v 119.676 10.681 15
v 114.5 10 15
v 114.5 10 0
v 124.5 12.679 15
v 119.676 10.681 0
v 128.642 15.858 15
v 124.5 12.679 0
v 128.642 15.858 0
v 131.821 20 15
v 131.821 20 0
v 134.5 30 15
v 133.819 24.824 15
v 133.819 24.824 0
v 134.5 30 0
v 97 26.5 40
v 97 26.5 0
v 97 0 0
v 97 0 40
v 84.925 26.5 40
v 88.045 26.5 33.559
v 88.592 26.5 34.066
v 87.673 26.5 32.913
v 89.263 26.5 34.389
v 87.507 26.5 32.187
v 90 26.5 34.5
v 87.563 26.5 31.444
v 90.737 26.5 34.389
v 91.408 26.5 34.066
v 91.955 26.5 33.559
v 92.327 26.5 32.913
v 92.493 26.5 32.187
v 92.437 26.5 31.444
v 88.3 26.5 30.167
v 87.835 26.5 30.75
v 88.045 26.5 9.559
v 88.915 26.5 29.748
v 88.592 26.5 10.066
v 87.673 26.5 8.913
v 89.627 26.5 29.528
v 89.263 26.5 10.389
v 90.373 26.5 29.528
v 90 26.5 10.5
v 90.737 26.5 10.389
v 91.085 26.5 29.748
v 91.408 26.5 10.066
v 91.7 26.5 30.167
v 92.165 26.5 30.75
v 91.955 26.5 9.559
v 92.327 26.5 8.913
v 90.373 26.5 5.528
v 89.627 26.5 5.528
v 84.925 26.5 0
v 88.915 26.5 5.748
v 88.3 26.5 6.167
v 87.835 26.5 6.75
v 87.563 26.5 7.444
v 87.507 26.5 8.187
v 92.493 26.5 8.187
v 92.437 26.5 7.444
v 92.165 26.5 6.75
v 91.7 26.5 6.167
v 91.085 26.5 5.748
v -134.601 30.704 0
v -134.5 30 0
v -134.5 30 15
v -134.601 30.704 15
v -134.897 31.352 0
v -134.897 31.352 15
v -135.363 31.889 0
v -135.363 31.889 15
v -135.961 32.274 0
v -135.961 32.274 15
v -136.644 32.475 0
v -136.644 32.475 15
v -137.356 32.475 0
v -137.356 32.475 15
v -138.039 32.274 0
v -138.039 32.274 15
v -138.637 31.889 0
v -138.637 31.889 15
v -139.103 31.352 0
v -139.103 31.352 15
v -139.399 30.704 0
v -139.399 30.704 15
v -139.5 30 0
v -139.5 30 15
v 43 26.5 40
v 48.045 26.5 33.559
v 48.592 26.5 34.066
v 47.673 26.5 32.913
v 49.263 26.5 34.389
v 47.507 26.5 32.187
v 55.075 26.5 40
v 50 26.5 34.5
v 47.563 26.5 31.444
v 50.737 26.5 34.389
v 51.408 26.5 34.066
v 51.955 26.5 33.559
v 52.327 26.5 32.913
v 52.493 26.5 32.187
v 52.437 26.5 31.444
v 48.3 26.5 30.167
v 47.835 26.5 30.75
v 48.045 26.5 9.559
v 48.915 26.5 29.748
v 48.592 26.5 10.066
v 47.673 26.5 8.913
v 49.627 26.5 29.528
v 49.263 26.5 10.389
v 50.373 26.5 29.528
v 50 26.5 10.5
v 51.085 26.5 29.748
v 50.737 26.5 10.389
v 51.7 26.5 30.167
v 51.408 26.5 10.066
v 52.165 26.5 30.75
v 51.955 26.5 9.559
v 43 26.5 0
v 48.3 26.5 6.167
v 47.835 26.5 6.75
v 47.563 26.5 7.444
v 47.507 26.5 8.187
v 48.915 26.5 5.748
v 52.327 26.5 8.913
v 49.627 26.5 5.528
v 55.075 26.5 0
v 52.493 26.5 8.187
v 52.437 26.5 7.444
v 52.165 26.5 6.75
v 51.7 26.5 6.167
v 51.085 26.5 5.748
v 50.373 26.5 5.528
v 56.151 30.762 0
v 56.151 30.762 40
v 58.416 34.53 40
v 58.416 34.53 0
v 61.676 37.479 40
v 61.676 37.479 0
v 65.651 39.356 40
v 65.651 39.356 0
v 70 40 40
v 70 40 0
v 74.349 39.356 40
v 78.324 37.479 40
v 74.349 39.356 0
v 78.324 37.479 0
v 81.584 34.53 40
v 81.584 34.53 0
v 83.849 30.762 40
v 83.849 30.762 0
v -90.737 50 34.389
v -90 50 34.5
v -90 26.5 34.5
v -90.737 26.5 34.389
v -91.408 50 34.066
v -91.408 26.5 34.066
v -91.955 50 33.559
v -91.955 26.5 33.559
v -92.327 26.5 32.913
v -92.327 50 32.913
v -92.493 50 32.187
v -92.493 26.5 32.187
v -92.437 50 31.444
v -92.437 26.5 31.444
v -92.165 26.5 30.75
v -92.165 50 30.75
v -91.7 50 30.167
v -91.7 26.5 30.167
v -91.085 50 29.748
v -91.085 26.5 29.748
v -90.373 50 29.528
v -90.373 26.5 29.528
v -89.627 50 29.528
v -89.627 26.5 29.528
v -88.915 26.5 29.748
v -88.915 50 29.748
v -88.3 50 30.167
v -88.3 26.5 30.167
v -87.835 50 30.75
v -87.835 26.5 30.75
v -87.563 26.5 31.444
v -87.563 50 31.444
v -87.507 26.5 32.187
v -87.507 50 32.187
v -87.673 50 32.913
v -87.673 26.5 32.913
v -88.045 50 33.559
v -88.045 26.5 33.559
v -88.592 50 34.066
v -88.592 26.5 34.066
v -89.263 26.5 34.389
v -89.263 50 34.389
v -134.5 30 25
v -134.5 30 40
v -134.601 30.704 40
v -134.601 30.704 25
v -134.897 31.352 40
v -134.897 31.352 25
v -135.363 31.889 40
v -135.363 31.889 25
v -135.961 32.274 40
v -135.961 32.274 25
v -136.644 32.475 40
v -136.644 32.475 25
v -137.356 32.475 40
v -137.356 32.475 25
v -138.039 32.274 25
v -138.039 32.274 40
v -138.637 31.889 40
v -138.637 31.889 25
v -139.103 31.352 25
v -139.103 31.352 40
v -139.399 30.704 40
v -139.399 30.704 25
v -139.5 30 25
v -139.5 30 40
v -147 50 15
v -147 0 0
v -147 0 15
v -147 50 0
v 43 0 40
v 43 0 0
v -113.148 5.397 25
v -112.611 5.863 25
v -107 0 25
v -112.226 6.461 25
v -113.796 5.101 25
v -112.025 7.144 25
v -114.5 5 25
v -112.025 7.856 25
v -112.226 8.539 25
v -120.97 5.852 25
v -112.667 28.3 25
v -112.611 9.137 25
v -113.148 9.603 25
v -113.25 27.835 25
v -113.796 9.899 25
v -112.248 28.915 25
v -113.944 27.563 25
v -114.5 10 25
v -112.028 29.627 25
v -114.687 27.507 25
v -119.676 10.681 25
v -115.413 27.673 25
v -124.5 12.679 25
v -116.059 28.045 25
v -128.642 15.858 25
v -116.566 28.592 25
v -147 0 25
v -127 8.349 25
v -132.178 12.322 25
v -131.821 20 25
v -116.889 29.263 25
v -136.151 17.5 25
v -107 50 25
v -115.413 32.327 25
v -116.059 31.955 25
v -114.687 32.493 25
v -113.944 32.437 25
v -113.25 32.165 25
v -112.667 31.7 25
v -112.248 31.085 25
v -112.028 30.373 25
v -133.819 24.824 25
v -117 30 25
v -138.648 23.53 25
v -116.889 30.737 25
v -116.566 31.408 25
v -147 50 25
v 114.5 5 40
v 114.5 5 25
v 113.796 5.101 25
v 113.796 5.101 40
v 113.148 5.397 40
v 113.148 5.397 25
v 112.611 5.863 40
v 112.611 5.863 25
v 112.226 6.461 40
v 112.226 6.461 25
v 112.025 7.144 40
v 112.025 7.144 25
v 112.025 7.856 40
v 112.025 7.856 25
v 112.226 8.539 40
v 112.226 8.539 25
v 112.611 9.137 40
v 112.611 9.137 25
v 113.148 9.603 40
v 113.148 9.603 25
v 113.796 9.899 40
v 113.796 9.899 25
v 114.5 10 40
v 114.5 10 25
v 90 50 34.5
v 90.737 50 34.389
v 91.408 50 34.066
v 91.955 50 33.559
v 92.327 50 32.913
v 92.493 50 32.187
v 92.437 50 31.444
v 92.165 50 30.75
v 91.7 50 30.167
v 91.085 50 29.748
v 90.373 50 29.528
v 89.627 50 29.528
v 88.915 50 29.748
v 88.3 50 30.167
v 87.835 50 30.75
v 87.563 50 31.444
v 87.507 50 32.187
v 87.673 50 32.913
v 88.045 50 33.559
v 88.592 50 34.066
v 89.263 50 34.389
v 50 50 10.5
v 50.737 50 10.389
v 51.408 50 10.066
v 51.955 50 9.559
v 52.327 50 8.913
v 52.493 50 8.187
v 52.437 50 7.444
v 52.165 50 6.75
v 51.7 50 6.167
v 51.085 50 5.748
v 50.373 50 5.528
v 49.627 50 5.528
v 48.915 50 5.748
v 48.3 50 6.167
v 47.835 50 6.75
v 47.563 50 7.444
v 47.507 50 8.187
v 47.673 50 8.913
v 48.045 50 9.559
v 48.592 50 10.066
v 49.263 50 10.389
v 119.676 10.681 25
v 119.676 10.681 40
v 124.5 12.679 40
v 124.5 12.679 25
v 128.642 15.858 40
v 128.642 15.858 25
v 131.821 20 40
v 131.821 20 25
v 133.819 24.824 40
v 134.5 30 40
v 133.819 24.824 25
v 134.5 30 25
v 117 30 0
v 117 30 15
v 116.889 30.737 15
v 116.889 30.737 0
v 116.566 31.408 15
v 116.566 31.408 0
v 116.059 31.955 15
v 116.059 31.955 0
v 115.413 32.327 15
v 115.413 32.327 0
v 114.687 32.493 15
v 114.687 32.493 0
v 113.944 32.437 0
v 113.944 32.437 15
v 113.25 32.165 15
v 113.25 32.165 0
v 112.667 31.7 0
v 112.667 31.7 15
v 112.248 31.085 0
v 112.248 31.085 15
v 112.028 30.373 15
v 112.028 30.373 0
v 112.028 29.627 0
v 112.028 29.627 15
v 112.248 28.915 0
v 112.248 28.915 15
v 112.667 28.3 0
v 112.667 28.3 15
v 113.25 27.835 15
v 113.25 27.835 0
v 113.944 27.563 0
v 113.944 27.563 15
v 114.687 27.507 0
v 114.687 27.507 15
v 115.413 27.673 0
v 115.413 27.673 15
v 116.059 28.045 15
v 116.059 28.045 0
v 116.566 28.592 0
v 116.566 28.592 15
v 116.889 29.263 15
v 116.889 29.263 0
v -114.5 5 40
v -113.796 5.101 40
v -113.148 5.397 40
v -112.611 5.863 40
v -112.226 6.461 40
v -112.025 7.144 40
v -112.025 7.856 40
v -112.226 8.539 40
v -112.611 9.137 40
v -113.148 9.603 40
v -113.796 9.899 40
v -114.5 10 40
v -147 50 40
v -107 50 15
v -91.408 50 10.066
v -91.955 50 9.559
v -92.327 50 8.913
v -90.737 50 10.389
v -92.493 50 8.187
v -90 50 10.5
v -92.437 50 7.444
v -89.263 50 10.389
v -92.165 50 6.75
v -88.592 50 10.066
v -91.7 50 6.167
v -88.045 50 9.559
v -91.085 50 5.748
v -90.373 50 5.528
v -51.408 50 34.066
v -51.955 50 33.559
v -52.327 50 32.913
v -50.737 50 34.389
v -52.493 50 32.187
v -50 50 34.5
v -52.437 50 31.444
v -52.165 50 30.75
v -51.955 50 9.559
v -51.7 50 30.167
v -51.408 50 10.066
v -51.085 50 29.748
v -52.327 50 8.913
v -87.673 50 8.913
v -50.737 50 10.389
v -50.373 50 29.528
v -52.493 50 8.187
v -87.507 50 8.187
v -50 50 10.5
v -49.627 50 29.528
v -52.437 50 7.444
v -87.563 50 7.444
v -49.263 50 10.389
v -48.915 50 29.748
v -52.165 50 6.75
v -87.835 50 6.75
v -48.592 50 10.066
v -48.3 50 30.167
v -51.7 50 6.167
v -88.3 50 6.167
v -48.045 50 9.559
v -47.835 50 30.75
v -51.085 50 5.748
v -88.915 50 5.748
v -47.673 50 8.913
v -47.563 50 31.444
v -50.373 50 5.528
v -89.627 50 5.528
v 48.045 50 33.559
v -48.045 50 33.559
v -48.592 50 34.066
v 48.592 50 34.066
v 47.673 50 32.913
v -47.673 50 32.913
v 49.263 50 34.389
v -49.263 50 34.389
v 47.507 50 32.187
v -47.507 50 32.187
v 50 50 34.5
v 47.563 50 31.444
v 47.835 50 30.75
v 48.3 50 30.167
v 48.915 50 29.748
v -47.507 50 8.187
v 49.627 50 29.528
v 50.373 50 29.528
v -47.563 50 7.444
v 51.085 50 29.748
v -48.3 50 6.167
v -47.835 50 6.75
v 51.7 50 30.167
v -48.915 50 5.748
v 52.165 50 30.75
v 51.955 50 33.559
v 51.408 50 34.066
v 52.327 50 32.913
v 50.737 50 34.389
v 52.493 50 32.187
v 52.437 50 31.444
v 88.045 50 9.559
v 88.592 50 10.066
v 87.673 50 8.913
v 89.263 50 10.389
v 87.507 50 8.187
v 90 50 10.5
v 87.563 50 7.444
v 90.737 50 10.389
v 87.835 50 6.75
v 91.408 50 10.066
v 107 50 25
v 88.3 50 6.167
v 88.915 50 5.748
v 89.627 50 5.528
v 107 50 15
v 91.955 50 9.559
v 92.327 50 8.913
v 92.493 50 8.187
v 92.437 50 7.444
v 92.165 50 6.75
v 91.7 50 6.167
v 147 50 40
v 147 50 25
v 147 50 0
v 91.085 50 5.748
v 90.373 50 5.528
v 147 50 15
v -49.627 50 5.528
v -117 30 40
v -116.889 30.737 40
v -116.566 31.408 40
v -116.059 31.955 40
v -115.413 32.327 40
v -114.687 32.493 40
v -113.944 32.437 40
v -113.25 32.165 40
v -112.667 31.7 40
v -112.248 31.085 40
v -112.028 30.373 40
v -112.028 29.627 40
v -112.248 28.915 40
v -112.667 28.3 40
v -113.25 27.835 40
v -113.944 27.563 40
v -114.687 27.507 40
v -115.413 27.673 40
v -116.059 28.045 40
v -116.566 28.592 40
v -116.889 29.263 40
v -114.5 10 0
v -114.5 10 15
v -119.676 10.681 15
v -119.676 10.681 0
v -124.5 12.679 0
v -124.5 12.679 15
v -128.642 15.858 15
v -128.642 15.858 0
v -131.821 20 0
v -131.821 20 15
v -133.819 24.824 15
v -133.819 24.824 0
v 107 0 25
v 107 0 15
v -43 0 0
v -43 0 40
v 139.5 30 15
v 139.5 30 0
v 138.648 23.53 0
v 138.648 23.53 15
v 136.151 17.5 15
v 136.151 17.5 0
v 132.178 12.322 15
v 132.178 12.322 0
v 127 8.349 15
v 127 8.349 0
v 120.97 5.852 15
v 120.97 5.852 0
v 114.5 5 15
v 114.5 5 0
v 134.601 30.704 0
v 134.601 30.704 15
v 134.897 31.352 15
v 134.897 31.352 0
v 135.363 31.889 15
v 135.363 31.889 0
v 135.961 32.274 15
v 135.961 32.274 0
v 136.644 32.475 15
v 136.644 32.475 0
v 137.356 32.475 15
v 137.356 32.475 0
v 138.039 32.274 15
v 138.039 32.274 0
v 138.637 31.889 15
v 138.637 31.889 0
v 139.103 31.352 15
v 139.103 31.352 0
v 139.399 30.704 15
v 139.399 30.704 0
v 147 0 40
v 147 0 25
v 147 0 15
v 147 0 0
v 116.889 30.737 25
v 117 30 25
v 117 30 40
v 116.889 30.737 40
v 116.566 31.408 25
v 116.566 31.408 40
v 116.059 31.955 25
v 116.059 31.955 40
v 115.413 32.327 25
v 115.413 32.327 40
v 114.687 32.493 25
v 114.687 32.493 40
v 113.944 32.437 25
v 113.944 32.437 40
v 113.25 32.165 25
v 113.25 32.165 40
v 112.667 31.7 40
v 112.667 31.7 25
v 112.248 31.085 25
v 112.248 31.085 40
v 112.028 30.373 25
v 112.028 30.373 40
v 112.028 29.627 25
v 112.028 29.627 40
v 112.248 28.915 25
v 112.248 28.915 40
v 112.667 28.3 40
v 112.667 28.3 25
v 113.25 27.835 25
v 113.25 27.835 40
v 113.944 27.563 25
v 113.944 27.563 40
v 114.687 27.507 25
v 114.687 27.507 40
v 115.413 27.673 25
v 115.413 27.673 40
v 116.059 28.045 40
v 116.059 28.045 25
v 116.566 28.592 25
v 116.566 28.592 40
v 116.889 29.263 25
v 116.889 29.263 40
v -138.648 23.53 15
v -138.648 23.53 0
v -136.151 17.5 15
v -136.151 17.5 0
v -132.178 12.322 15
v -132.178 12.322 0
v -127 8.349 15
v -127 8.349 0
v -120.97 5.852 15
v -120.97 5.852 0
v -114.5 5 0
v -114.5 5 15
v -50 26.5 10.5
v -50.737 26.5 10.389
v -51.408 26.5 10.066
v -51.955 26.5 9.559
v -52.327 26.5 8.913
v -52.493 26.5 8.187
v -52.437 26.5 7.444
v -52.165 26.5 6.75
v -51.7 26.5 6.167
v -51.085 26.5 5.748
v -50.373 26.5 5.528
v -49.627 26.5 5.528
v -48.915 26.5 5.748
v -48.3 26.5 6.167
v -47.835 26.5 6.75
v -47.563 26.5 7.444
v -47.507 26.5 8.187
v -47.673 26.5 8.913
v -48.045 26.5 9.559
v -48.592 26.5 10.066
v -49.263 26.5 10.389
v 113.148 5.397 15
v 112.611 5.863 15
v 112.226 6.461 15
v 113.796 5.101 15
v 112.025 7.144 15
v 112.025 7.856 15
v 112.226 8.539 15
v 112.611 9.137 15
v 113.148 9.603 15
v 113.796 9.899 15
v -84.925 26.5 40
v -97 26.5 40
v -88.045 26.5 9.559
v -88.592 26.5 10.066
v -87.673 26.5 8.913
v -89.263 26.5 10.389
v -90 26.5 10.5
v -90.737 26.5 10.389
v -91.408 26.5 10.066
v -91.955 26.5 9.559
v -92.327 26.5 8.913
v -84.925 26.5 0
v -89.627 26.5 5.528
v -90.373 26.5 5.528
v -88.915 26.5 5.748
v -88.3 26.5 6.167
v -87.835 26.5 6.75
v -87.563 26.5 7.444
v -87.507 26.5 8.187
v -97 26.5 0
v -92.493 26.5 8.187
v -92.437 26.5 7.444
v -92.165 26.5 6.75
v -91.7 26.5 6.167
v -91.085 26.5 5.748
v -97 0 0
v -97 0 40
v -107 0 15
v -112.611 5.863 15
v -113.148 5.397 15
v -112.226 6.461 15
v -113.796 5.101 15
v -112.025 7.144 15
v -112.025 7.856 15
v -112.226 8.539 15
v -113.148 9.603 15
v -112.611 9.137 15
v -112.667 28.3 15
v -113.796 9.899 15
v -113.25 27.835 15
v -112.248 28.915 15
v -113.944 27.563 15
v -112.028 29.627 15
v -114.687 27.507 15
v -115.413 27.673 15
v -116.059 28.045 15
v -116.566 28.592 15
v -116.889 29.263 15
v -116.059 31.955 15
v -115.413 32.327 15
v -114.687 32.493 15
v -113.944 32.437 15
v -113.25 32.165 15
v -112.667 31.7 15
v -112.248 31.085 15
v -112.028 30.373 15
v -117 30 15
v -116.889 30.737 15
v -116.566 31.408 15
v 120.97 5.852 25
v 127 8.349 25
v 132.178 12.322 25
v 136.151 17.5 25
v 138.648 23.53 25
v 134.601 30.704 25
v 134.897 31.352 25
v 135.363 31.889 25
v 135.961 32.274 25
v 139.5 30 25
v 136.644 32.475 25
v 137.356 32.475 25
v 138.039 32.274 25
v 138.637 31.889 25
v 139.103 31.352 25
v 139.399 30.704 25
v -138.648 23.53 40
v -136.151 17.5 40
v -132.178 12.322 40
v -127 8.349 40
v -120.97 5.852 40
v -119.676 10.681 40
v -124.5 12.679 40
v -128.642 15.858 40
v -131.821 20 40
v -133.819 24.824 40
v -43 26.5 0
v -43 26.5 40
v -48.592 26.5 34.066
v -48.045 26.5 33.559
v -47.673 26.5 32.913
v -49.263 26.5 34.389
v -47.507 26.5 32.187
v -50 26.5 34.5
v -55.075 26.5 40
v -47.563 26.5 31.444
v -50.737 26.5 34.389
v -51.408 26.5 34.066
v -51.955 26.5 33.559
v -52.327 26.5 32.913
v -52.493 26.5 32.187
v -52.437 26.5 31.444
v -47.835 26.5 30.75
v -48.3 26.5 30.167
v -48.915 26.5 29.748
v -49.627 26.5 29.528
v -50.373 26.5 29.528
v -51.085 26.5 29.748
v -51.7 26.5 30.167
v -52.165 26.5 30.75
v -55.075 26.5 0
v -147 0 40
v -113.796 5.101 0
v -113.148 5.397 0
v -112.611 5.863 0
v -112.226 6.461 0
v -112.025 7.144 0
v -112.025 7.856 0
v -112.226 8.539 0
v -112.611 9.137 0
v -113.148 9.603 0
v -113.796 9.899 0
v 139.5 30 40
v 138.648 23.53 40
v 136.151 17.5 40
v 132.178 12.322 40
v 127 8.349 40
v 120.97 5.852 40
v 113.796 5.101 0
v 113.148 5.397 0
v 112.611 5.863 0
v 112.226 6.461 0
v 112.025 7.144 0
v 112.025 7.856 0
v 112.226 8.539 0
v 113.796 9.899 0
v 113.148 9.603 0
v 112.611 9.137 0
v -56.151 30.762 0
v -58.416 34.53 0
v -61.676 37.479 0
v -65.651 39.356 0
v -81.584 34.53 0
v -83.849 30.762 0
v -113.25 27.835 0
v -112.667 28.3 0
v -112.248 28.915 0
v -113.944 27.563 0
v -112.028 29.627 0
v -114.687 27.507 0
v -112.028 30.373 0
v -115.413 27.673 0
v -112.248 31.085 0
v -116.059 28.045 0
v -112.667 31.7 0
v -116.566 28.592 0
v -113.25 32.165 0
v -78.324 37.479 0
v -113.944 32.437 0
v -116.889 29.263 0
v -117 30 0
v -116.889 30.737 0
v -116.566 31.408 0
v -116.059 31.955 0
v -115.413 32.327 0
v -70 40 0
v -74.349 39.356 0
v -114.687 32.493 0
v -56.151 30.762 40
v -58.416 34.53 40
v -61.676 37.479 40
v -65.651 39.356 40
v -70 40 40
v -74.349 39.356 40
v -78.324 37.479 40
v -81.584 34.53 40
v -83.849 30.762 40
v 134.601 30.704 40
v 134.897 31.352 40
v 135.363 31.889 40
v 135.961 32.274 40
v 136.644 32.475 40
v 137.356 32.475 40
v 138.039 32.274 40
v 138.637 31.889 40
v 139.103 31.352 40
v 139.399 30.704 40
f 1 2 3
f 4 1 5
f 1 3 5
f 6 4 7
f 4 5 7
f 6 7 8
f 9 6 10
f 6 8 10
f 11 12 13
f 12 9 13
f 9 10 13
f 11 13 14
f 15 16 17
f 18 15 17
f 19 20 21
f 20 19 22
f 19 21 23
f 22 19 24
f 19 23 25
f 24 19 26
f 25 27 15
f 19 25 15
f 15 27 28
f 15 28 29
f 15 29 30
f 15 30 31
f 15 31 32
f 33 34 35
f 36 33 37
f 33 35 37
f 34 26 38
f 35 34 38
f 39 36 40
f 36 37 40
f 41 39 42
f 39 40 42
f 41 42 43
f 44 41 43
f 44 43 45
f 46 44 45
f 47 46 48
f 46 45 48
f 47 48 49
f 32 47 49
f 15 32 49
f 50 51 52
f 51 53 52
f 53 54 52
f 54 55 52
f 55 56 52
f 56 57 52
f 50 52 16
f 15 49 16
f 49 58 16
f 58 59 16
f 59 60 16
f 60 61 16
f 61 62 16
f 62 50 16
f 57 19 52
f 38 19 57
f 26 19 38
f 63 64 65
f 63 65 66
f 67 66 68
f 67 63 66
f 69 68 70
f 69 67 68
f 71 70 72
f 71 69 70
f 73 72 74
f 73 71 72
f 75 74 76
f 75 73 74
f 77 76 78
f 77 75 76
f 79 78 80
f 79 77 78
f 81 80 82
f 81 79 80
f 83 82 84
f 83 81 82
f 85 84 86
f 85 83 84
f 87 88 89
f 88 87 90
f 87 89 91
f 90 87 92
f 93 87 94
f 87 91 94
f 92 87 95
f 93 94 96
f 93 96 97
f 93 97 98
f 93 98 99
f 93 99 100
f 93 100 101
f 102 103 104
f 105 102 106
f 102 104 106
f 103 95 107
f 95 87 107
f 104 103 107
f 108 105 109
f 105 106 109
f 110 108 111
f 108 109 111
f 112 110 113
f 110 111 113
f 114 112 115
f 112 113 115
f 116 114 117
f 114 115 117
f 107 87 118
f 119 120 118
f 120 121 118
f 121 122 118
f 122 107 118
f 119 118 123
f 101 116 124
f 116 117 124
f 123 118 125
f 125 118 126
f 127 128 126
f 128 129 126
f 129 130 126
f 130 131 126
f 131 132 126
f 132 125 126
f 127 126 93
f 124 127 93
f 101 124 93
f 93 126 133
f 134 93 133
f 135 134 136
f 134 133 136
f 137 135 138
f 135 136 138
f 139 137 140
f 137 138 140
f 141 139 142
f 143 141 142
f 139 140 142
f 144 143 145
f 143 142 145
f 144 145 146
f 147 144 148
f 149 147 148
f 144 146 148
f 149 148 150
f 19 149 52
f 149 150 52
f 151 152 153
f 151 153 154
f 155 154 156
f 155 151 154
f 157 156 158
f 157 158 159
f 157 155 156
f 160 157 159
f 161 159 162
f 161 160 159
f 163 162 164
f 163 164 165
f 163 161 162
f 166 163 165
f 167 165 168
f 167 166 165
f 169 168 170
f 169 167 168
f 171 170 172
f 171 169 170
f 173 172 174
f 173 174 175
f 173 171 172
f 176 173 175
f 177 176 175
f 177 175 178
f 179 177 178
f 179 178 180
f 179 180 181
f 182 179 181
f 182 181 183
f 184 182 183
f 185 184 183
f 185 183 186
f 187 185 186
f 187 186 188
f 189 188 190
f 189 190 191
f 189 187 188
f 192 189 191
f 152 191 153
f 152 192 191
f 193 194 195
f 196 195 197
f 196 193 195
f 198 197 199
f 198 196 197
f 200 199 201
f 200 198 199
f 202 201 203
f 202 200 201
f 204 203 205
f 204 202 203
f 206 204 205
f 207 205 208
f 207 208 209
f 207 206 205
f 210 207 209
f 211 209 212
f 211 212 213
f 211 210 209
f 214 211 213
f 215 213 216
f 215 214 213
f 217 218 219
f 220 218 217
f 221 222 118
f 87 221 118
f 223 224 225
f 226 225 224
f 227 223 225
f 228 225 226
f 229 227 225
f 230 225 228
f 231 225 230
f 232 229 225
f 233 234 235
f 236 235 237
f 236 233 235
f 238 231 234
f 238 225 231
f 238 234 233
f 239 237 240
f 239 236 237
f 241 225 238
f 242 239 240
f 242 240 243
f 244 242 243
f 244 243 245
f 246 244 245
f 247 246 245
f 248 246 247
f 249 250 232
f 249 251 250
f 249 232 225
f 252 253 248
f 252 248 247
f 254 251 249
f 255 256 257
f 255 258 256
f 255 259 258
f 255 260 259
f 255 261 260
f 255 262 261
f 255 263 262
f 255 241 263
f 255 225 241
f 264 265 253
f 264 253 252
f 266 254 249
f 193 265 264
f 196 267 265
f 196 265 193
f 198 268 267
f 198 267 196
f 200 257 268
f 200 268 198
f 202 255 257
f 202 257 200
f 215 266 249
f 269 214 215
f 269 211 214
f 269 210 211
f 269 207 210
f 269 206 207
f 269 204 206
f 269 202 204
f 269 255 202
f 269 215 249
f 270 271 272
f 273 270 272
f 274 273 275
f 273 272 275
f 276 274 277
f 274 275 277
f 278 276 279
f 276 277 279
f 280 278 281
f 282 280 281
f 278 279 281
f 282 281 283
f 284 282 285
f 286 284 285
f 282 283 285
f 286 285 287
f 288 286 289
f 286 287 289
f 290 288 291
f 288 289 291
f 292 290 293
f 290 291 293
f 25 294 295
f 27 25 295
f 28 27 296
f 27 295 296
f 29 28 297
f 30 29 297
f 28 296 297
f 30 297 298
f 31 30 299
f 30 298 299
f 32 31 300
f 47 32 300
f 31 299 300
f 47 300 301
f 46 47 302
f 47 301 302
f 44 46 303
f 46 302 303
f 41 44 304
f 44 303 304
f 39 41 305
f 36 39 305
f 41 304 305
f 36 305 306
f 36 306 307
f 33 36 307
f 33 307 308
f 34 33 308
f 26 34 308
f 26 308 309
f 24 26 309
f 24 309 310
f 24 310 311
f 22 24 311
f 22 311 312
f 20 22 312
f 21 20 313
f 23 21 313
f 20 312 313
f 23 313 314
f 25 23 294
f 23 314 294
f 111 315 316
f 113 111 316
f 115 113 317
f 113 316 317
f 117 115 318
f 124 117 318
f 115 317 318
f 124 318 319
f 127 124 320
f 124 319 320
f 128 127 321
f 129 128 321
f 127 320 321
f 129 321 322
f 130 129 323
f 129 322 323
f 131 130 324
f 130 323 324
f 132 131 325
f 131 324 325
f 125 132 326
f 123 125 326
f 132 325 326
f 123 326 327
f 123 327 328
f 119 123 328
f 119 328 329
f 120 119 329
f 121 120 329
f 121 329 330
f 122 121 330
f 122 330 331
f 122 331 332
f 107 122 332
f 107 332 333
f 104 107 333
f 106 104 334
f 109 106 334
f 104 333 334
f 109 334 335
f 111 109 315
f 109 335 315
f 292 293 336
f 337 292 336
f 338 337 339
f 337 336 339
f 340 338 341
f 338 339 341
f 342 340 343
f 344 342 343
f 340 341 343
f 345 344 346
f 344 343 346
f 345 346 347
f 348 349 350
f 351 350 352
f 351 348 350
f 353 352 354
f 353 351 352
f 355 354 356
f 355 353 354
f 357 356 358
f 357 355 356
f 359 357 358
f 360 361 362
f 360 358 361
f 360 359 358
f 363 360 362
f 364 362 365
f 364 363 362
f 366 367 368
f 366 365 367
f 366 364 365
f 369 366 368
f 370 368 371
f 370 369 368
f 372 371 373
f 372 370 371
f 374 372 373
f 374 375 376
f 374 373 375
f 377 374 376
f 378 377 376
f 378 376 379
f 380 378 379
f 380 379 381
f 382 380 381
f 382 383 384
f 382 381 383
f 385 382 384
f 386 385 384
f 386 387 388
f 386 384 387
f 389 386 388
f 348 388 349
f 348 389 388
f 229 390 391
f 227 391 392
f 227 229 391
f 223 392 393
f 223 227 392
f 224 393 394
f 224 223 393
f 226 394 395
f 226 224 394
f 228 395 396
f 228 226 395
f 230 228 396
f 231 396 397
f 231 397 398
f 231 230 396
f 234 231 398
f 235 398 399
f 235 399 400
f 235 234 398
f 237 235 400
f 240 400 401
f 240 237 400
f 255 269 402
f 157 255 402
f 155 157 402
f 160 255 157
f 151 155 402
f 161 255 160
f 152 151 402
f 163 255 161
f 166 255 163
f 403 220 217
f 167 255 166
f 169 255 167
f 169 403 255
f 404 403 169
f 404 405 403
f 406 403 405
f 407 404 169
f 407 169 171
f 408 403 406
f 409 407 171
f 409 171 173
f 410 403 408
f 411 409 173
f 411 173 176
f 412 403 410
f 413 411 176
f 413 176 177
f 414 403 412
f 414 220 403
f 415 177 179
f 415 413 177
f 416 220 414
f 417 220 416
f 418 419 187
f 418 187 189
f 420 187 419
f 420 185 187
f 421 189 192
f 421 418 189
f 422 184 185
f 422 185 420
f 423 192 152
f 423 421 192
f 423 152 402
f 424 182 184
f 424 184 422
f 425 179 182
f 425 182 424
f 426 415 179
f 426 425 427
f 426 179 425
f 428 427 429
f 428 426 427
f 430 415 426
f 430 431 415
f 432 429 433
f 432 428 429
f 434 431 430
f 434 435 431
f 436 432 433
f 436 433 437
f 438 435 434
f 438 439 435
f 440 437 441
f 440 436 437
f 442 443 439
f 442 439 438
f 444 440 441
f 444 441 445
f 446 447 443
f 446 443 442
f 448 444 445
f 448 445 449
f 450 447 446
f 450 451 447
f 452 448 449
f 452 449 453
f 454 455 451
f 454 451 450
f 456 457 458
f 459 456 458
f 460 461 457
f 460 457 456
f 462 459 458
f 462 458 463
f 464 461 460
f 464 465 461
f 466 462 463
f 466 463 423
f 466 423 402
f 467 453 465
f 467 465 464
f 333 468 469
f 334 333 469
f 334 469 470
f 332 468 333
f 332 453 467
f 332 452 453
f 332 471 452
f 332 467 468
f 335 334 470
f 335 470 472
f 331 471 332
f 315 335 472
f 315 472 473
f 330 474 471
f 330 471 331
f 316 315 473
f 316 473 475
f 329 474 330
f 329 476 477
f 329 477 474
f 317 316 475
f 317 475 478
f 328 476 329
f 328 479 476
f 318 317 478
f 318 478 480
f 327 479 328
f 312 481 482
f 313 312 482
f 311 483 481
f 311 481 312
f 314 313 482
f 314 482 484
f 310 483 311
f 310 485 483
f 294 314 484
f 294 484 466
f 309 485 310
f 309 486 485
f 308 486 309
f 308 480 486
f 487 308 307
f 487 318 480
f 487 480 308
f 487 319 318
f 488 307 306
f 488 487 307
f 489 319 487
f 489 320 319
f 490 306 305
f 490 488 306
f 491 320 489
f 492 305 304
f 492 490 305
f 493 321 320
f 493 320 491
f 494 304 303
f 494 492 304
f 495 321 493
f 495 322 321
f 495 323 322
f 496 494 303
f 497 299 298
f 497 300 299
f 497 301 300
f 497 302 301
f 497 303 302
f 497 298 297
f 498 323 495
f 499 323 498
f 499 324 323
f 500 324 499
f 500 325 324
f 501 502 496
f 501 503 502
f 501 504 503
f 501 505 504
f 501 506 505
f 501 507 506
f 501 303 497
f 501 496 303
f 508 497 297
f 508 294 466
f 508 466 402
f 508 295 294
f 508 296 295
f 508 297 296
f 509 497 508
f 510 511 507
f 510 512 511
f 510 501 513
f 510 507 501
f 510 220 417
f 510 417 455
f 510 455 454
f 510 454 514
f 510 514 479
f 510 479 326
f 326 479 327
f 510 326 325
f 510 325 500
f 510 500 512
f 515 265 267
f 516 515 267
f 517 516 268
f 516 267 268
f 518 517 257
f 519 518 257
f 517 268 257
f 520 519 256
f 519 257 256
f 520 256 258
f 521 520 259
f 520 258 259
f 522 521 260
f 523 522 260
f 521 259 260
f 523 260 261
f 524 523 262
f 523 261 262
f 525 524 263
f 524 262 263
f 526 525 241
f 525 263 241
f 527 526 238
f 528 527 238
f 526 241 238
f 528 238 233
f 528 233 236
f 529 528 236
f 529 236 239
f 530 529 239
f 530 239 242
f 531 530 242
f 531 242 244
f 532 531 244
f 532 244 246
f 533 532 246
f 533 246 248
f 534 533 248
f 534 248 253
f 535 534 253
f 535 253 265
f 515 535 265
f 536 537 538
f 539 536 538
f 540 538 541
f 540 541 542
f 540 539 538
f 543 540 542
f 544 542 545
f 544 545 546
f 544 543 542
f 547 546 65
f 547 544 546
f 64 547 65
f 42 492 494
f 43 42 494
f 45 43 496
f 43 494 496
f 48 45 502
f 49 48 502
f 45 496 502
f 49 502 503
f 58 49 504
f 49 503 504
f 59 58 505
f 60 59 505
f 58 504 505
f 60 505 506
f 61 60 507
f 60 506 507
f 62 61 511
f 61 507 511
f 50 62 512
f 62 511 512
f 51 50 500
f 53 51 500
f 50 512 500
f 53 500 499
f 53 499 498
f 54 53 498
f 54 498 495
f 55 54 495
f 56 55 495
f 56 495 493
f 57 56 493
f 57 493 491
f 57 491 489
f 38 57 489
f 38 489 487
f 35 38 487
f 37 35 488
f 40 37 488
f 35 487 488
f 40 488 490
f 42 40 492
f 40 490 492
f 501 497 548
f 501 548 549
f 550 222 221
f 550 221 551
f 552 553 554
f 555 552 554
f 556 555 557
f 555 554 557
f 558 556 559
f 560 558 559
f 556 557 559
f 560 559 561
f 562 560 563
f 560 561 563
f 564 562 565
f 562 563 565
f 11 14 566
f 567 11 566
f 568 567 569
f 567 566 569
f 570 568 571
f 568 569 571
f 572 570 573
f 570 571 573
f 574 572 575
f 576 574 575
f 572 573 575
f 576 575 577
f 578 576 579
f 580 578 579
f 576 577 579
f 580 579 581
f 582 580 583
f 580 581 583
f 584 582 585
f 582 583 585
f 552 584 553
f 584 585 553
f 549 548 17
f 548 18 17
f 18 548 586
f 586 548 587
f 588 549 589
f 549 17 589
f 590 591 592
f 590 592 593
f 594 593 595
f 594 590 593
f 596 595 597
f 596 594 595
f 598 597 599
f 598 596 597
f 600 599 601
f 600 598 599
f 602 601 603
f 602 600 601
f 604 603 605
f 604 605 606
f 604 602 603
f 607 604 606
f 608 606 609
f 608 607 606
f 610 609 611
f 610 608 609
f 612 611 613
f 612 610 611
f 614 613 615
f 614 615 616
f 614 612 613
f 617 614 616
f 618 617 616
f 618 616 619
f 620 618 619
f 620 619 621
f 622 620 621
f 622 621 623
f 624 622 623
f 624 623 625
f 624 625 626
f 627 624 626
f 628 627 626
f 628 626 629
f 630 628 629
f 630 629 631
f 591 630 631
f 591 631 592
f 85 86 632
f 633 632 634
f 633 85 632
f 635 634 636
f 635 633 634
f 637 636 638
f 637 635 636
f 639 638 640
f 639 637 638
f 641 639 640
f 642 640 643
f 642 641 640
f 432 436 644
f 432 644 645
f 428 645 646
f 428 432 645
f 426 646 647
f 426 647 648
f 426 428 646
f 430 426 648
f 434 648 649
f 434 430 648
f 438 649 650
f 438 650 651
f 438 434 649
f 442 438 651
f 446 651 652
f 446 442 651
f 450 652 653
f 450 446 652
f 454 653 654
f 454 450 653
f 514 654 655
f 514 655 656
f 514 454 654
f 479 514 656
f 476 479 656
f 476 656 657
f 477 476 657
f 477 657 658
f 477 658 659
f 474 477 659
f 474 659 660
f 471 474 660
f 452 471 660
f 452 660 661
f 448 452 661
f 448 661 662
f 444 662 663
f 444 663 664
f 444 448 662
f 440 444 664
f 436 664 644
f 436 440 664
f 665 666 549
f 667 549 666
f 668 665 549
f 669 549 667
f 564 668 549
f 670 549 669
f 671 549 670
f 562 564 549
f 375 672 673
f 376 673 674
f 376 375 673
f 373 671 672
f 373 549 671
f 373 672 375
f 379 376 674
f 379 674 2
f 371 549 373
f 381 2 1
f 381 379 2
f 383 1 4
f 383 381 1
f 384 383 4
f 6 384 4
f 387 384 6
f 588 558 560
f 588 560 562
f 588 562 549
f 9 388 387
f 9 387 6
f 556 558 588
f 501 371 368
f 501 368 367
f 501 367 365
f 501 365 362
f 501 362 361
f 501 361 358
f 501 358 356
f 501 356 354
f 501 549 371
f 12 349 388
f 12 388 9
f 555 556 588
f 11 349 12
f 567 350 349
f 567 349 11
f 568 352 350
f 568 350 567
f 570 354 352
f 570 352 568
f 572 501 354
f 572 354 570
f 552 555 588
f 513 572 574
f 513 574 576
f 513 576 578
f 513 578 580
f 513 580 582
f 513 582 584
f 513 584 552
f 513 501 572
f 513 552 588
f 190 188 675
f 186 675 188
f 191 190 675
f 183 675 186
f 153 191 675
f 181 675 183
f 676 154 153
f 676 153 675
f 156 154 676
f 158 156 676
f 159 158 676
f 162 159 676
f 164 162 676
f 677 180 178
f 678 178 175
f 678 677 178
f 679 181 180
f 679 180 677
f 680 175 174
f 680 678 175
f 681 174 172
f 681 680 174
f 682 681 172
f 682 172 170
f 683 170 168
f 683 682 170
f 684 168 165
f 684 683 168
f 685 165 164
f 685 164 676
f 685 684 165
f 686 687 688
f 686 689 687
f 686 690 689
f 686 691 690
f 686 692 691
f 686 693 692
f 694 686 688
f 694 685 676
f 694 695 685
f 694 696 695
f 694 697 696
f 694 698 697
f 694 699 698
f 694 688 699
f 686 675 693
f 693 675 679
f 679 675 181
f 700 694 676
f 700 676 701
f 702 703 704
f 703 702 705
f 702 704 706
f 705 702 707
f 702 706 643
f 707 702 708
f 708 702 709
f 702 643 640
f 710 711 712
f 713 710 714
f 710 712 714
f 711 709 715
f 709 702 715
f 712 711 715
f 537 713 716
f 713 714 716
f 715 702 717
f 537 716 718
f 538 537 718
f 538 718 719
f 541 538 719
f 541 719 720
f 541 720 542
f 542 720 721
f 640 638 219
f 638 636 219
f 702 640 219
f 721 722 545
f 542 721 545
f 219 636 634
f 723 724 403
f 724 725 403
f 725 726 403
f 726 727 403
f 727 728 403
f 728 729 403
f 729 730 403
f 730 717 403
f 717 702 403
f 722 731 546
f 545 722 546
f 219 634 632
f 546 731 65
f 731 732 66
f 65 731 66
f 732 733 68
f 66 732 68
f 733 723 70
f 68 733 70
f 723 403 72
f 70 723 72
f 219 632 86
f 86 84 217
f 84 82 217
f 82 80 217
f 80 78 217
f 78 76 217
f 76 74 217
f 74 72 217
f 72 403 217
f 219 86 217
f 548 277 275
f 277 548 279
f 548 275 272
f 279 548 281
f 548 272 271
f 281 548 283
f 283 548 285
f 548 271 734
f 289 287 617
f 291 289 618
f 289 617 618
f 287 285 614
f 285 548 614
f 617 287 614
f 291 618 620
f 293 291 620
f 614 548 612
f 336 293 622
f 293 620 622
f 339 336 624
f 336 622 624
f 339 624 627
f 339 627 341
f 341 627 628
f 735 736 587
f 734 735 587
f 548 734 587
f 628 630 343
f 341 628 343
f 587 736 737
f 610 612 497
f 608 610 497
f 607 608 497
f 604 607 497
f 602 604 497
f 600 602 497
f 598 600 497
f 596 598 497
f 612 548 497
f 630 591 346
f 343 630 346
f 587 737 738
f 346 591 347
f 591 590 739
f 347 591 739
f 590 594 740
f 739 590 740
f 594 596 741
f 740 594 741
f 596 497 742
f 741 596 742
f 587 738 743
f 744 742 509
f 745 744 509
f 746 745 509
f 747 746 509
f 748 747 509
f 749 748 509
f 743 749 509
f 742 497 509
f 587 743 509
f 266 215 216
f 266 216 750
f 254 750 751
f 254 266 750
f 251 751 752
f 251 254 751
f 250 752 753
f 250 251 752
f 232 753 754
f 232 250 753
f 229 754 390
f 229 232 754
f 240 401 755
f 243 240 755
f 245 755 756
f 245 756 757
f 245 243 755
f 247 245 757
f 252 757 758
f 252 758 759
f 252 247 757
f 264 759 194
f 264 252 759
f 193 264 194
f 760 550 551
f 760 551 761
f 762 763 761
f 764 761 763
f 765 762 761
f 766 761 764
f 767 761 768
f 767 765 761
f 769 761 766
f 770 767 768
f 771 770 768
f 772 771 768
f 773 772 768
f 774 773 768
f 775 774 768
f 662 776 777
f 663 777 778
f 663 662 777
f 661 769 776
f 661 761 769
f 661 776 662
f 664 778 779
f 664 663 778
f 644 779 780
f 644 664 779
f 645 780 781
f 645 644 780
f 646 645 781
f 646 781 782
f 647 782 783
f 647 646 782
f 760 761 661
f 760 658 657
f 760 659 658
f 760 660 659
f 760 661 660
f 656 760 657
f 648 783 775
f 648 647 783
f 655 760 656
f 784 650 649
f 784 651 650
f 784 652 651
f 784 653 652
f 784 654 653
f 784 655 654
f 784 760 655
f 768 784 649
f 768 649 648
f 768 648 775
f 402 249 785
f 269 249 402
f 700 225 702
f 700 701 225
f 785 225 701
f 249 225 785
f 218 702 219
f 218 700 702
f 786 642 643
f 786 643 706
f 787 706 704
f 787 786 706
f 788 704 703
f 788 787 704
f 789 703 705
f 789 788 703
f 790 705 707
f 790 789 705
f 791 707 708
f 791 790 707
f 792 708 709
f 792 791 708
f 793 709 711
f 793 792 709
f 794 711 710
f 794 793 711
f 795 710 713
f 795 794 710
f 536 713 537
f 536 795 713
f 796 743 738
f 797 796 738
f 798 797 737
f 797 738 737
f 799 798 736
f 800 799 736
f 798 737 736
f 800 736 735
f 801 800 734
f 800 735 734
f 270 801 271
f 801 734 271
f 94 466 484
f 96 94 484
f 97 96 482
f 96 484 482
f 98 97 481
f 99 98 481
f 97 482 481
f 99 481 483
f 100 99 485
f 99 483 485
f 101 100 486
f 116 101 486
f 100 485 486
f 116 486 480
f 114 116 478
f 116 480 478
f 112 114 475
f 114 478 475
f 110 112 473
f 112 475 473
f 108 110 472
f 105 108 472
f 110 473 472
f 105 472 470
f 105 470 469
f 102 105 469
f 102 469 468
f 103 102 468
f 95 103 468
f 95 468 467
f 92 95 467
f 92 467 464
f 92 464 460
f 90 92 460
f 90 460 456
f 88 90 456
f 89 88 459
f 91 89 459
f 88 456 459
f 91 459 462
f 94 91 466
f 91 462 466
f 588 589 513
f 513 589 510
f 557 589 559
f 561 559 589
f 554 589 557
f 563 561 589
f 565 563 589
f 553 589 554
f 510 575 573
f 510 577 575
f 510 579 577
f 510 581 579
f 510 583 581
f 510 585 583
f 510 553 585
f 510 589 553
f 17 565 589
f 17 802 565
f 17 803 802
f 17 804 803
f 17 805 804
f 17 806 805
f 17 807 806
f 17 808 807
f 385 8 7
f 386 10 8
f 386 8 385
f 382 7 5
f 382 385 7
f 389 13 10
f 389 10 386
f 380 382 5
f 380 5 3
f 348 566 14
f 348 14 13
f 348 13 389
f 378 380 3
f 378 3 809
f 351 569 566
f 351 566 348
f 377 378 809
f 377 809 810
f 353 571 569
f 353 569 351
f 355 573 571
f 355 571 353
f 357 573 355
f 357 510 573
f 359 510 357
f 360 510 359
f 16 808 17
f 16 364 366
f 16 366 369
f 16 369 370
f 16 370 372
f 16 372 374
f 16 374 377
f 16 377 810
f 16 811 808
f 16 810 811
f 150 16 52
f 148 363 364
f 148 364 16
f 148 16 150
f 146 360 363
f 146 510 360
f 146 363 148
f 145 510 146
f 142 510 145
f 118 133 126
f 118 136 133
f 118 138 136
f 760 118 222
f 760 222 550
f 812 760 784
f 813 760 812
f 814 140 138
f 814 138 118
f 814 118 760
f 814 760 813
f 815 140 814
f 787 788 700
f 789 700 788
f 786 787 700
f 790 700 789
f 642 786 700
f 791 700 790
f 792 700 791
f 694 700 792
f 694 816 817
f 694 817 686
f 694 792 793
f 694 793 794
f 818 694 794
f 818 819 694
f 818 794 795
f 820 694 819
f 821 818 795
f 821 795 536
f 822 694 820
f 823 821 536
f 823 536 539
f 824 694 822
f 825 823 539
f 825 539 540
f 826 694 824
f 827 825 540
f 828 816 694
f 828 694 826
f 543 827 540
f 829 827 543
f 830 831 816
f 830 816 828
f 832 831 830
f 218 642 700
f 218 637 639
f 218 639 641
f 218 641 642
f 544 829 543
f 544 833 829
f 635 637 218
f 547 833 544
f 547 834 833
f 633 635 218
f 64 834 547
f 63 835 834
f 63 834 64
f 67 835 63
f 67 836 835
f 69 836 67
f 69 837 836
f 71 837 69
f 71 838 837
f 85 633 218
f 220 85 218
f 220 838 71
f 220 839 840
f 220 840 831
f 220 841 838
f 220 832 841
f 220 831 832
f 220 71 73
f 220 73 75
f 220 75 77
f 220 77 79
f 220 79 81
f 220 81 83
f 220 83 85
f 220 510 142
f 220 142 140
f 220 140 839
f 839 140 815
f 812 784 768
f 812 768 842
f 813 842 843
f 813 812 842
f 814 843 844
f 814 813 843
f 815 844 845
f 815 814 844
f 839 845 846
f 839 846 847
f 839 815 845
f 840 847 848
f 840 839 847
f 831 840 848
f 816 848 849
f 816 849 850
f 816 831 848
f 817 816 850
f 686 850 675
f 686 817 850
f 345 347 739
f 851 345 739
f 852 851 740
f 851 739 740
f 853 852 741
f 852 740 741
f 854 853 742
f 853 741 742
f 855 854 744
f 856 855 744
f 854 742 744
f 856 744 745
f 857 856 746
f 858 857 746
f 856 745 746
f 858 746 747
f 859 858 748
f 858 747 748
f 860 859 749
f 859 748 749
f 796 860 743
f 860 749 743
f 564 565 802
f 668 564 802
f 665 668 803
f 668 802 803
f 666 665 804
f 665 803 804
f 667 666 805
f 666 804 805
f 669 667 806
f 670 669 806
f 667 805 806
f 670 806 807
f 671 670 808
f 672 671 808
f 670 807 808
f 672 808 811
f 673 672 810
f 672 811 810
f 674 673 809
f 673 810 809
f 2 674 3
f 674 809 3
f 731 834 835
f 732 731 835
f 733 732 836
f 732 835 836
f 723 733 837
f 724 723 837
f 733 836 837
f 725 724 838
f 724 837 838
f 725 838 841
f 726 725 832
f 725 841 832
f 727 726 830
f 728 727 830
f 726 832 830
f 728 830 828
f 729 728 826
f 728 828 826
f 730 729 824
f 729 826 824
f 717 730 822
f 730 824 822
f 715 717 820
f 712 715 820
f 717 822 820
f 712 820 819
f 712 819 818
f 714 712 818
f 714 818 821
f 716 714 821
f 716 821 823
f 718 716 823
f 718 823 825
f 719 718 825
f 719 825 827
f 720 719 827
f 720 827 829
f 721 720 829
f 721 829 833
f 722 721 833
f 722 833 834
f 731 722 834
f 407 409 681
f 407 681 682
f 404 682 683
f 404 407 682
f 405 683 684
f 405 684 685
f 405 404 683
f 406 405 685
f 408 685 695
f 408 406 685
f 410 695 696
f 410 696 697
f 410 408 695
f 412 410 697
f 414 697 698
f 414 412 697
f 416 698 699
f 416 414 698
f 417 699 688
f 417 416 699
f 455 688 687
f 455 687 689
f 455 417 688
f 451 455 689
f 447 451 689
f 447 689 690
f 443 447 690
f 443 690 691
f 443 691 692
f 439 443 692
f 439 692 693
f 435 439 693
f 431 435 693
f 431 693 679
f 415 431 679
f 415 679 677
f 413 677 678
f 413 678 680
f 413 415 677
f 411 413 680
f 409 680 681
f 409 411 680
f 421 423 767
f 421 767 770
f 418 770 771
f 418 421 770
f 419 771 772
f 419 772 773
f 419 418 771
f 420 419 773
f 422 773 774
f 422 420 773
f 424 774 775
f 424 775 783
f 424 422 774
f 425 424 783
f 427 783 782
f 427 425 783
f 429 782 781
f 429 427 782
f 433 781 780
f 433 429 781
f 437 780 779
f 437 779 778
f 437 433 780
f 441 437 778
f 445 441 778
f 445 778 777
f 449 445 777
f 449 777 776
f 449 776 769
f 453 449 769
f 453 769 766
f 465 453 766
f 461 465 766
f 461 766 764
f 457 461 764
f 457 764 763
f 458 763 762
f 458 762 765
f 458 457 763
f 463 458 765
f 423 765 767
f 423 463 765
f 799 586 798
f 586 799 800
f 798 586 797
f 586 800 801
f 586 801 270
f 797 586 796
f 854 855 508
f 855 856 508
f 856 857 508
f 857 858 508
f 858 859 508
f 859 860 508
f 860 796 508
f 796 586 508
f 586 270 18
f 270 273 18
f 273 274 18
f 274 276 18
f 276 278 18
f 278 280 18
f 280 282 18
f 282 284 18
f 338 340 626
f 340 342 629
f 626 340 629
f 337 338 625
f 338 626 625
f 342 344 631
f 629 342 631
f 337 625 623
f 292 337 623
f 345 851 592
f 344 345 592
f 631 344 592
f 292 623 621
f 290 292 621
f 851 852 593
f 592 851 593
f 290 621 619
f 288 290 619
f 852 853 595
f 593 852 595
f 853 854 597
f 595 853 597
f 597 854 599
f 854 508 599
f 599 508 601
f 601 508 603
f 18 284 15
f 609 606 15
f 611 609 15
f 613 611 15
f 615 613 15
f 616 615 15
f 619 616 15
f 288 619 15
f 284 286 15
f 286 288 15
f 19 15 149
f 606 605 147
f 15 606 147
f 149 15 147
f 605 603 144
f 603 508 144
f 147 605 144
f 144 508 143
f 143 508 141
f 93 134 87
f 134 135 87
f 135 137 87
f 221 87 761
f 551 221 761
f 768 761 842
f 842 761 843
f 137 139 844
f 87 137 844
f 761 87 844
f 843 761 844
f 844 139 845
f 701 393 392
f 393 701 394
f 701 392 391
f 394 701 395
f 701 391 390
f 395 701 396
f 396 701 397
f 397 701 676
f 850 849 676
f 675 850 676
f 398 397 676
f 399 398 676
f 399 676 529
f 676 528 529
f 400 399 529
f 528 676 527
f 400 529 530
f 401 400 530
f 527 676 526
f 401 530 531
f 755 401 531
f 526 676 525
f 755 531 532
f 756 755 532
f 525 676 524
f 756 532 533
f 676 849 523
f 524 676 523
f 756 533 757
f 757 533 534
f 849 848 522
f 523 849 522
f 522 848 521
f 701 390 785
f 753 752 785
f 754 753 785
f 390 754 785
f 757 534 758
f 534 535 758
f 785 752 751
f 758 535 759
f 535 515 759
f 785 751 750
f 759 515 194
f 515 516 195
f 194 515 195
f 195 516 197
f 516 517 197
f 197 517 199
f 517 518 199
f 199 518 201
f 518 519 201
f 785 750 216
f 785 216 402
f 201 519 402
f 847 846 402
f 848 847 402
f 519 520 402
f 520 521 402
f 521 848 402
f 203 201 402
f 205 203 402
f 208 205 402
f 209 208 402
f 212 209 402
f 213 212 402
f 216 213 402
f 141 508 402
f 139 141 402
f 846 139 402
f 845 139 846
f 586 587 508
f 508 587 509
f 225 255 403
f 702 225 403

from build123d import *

# Parameters (mm, degrees)
SKETCH1_R           = 2.5
BOSS_EXTRUDE1_DEPTH = 40
SKETCH3_R           = 2.5
CUT_EXTRUDE2_DEPTH  = 23.5
CUT_EXTRUDE3_REACH  = 162.34
SKETCH4_W           = 40
SKETCH4_H           = 10


with BuildPart() as part:
    # Sketch1 → Boss-Extrude1 (new body)
    with BuildSketch(Plane.XY):
        with BuildLine():
            Line((0, 50), (0, 0))
            Line((0, 0), (43, 0))
            Line((43, 0), (43, 26.5))
            Line((43, 26.5), (55.075188443, 26.5))
            ThreePointArc((55.075188443, 26.5), (70, 40), (84.924811557, 26.5))
            Line((84.924811557, 26.5), (97, 26.5))
            Line((97, 26.5), (97, 0))
            Line((97, 0), (147, 0))
            Line((147, 0), (147, 50))
            Line((147, 50), (62, 50))
            Line((62, 50), (23, 50))
            Line((23, 50), (0, 50))
        make_face()
        with BuildLine():
            ThreePointArc((139.5, 30), (132.17766953, 12.32233047), (114.5, 5))
            ThreePointArc((114.5, 5), (112, 7.5), (114.5, 10))
            ThreePointArc((114.5, 10), (128.642135624, 15.857864376), (134.5, 30))
            ThreePointArc((134.5, 30), (137, 32.5), (139.5, 30))
        make_face(mode=Mode.SUBTRACT)
        with Locations((114.5, 30)):
            Circle(SKETCH1_R, mode=Mode.SUBTRACT)
    boss_extrude1 = extrude(amount=BOSS_EXTRUDE1_DEPTH)

    # Sketch3 → Cut-Extrude2 (cut)
    with BuildSketch(Plane(origin=(0, 50, 0), x_dir=(1, 0, 0), z_dir=(0, 1, 0))):
        with Locations(Location((50, -32, 0), (0, 0, 270))):
            Circle(SKETCH3_R)
        with Locations(Location((90, -32, 0), (0, 0, 270))):
            Circle(SKETCH3_R)
        with Locations(Location((50, -8, 0), (0, 0, 270))):
            Circle(SKETCH3_R)
        with Locations(Location((90, -8, 0), (0, 0, 270))):
            Circle(SKETCH3_R)
    cut_extrude2 = extrude(amount=-CUT_EXTRUDE2_DEPTH, mode=Mode.SUBTRACT)

    # Cut-Extrude3: up to this face of the body (flat: up to its plane)
    cut_extrude3_end = Plane(part.part.faces().sort_by_distance((122, 0, 20))[0])
    # Sketch4 → Cut-Extrude3 (cut, up to the picked face)
    with BuildSketch(Plane(origin=(0, 50, 0), x_dir=(1, 0, 0), z_dir=(0, 1, 0)), mode=Mode.PRIVATE) as cut_extrude3_sk1:
        with Locations((127, -20)):
            Rectangle(SKETCH4_W, SKETCH4_H)
    cut_extrude3_tool1 = split(extrude(cut_extrude3_sk1.sketch, amount=-CUT_EXTRUDE3_REACH, mode=Mode.PRIVATE), bisect_by=cut_extrude3_end, keep=Keep.BOTH, mode=Mode.PRIVATE)
    cut_extrude3 = cut_extrude3_tool1.solids().sort_by(Axis((127, 50, 20), (0, -1, 0)))[0]
    add(cut_extrude3, mode=Mode.SUBTRACT)

    # Mirror2: Boss-Extrude1, Cut-Extrude2, Cut-Extrude3 across plane
    add(boss_extrude1.mirror(Plane(origin=(0, 0, 40), x_dir=(0, 0, 1), z_dir=(-1, 0, 0))))
    add(cut_extrude2.mirror(Plane(origin=(0, 0, 40), x_dir=(0, 0, 1), z_dir=(-1, 0, 0))), mode=Mode.SUBTRACT)
    add(cut_extrude3.mirror(Plane(origin=(0, 0, 40), x_dir=(0, 0, 1), z_dir=(-1, 0, 0))), mode=Mode.SUBTRACT)


solid = part.part
